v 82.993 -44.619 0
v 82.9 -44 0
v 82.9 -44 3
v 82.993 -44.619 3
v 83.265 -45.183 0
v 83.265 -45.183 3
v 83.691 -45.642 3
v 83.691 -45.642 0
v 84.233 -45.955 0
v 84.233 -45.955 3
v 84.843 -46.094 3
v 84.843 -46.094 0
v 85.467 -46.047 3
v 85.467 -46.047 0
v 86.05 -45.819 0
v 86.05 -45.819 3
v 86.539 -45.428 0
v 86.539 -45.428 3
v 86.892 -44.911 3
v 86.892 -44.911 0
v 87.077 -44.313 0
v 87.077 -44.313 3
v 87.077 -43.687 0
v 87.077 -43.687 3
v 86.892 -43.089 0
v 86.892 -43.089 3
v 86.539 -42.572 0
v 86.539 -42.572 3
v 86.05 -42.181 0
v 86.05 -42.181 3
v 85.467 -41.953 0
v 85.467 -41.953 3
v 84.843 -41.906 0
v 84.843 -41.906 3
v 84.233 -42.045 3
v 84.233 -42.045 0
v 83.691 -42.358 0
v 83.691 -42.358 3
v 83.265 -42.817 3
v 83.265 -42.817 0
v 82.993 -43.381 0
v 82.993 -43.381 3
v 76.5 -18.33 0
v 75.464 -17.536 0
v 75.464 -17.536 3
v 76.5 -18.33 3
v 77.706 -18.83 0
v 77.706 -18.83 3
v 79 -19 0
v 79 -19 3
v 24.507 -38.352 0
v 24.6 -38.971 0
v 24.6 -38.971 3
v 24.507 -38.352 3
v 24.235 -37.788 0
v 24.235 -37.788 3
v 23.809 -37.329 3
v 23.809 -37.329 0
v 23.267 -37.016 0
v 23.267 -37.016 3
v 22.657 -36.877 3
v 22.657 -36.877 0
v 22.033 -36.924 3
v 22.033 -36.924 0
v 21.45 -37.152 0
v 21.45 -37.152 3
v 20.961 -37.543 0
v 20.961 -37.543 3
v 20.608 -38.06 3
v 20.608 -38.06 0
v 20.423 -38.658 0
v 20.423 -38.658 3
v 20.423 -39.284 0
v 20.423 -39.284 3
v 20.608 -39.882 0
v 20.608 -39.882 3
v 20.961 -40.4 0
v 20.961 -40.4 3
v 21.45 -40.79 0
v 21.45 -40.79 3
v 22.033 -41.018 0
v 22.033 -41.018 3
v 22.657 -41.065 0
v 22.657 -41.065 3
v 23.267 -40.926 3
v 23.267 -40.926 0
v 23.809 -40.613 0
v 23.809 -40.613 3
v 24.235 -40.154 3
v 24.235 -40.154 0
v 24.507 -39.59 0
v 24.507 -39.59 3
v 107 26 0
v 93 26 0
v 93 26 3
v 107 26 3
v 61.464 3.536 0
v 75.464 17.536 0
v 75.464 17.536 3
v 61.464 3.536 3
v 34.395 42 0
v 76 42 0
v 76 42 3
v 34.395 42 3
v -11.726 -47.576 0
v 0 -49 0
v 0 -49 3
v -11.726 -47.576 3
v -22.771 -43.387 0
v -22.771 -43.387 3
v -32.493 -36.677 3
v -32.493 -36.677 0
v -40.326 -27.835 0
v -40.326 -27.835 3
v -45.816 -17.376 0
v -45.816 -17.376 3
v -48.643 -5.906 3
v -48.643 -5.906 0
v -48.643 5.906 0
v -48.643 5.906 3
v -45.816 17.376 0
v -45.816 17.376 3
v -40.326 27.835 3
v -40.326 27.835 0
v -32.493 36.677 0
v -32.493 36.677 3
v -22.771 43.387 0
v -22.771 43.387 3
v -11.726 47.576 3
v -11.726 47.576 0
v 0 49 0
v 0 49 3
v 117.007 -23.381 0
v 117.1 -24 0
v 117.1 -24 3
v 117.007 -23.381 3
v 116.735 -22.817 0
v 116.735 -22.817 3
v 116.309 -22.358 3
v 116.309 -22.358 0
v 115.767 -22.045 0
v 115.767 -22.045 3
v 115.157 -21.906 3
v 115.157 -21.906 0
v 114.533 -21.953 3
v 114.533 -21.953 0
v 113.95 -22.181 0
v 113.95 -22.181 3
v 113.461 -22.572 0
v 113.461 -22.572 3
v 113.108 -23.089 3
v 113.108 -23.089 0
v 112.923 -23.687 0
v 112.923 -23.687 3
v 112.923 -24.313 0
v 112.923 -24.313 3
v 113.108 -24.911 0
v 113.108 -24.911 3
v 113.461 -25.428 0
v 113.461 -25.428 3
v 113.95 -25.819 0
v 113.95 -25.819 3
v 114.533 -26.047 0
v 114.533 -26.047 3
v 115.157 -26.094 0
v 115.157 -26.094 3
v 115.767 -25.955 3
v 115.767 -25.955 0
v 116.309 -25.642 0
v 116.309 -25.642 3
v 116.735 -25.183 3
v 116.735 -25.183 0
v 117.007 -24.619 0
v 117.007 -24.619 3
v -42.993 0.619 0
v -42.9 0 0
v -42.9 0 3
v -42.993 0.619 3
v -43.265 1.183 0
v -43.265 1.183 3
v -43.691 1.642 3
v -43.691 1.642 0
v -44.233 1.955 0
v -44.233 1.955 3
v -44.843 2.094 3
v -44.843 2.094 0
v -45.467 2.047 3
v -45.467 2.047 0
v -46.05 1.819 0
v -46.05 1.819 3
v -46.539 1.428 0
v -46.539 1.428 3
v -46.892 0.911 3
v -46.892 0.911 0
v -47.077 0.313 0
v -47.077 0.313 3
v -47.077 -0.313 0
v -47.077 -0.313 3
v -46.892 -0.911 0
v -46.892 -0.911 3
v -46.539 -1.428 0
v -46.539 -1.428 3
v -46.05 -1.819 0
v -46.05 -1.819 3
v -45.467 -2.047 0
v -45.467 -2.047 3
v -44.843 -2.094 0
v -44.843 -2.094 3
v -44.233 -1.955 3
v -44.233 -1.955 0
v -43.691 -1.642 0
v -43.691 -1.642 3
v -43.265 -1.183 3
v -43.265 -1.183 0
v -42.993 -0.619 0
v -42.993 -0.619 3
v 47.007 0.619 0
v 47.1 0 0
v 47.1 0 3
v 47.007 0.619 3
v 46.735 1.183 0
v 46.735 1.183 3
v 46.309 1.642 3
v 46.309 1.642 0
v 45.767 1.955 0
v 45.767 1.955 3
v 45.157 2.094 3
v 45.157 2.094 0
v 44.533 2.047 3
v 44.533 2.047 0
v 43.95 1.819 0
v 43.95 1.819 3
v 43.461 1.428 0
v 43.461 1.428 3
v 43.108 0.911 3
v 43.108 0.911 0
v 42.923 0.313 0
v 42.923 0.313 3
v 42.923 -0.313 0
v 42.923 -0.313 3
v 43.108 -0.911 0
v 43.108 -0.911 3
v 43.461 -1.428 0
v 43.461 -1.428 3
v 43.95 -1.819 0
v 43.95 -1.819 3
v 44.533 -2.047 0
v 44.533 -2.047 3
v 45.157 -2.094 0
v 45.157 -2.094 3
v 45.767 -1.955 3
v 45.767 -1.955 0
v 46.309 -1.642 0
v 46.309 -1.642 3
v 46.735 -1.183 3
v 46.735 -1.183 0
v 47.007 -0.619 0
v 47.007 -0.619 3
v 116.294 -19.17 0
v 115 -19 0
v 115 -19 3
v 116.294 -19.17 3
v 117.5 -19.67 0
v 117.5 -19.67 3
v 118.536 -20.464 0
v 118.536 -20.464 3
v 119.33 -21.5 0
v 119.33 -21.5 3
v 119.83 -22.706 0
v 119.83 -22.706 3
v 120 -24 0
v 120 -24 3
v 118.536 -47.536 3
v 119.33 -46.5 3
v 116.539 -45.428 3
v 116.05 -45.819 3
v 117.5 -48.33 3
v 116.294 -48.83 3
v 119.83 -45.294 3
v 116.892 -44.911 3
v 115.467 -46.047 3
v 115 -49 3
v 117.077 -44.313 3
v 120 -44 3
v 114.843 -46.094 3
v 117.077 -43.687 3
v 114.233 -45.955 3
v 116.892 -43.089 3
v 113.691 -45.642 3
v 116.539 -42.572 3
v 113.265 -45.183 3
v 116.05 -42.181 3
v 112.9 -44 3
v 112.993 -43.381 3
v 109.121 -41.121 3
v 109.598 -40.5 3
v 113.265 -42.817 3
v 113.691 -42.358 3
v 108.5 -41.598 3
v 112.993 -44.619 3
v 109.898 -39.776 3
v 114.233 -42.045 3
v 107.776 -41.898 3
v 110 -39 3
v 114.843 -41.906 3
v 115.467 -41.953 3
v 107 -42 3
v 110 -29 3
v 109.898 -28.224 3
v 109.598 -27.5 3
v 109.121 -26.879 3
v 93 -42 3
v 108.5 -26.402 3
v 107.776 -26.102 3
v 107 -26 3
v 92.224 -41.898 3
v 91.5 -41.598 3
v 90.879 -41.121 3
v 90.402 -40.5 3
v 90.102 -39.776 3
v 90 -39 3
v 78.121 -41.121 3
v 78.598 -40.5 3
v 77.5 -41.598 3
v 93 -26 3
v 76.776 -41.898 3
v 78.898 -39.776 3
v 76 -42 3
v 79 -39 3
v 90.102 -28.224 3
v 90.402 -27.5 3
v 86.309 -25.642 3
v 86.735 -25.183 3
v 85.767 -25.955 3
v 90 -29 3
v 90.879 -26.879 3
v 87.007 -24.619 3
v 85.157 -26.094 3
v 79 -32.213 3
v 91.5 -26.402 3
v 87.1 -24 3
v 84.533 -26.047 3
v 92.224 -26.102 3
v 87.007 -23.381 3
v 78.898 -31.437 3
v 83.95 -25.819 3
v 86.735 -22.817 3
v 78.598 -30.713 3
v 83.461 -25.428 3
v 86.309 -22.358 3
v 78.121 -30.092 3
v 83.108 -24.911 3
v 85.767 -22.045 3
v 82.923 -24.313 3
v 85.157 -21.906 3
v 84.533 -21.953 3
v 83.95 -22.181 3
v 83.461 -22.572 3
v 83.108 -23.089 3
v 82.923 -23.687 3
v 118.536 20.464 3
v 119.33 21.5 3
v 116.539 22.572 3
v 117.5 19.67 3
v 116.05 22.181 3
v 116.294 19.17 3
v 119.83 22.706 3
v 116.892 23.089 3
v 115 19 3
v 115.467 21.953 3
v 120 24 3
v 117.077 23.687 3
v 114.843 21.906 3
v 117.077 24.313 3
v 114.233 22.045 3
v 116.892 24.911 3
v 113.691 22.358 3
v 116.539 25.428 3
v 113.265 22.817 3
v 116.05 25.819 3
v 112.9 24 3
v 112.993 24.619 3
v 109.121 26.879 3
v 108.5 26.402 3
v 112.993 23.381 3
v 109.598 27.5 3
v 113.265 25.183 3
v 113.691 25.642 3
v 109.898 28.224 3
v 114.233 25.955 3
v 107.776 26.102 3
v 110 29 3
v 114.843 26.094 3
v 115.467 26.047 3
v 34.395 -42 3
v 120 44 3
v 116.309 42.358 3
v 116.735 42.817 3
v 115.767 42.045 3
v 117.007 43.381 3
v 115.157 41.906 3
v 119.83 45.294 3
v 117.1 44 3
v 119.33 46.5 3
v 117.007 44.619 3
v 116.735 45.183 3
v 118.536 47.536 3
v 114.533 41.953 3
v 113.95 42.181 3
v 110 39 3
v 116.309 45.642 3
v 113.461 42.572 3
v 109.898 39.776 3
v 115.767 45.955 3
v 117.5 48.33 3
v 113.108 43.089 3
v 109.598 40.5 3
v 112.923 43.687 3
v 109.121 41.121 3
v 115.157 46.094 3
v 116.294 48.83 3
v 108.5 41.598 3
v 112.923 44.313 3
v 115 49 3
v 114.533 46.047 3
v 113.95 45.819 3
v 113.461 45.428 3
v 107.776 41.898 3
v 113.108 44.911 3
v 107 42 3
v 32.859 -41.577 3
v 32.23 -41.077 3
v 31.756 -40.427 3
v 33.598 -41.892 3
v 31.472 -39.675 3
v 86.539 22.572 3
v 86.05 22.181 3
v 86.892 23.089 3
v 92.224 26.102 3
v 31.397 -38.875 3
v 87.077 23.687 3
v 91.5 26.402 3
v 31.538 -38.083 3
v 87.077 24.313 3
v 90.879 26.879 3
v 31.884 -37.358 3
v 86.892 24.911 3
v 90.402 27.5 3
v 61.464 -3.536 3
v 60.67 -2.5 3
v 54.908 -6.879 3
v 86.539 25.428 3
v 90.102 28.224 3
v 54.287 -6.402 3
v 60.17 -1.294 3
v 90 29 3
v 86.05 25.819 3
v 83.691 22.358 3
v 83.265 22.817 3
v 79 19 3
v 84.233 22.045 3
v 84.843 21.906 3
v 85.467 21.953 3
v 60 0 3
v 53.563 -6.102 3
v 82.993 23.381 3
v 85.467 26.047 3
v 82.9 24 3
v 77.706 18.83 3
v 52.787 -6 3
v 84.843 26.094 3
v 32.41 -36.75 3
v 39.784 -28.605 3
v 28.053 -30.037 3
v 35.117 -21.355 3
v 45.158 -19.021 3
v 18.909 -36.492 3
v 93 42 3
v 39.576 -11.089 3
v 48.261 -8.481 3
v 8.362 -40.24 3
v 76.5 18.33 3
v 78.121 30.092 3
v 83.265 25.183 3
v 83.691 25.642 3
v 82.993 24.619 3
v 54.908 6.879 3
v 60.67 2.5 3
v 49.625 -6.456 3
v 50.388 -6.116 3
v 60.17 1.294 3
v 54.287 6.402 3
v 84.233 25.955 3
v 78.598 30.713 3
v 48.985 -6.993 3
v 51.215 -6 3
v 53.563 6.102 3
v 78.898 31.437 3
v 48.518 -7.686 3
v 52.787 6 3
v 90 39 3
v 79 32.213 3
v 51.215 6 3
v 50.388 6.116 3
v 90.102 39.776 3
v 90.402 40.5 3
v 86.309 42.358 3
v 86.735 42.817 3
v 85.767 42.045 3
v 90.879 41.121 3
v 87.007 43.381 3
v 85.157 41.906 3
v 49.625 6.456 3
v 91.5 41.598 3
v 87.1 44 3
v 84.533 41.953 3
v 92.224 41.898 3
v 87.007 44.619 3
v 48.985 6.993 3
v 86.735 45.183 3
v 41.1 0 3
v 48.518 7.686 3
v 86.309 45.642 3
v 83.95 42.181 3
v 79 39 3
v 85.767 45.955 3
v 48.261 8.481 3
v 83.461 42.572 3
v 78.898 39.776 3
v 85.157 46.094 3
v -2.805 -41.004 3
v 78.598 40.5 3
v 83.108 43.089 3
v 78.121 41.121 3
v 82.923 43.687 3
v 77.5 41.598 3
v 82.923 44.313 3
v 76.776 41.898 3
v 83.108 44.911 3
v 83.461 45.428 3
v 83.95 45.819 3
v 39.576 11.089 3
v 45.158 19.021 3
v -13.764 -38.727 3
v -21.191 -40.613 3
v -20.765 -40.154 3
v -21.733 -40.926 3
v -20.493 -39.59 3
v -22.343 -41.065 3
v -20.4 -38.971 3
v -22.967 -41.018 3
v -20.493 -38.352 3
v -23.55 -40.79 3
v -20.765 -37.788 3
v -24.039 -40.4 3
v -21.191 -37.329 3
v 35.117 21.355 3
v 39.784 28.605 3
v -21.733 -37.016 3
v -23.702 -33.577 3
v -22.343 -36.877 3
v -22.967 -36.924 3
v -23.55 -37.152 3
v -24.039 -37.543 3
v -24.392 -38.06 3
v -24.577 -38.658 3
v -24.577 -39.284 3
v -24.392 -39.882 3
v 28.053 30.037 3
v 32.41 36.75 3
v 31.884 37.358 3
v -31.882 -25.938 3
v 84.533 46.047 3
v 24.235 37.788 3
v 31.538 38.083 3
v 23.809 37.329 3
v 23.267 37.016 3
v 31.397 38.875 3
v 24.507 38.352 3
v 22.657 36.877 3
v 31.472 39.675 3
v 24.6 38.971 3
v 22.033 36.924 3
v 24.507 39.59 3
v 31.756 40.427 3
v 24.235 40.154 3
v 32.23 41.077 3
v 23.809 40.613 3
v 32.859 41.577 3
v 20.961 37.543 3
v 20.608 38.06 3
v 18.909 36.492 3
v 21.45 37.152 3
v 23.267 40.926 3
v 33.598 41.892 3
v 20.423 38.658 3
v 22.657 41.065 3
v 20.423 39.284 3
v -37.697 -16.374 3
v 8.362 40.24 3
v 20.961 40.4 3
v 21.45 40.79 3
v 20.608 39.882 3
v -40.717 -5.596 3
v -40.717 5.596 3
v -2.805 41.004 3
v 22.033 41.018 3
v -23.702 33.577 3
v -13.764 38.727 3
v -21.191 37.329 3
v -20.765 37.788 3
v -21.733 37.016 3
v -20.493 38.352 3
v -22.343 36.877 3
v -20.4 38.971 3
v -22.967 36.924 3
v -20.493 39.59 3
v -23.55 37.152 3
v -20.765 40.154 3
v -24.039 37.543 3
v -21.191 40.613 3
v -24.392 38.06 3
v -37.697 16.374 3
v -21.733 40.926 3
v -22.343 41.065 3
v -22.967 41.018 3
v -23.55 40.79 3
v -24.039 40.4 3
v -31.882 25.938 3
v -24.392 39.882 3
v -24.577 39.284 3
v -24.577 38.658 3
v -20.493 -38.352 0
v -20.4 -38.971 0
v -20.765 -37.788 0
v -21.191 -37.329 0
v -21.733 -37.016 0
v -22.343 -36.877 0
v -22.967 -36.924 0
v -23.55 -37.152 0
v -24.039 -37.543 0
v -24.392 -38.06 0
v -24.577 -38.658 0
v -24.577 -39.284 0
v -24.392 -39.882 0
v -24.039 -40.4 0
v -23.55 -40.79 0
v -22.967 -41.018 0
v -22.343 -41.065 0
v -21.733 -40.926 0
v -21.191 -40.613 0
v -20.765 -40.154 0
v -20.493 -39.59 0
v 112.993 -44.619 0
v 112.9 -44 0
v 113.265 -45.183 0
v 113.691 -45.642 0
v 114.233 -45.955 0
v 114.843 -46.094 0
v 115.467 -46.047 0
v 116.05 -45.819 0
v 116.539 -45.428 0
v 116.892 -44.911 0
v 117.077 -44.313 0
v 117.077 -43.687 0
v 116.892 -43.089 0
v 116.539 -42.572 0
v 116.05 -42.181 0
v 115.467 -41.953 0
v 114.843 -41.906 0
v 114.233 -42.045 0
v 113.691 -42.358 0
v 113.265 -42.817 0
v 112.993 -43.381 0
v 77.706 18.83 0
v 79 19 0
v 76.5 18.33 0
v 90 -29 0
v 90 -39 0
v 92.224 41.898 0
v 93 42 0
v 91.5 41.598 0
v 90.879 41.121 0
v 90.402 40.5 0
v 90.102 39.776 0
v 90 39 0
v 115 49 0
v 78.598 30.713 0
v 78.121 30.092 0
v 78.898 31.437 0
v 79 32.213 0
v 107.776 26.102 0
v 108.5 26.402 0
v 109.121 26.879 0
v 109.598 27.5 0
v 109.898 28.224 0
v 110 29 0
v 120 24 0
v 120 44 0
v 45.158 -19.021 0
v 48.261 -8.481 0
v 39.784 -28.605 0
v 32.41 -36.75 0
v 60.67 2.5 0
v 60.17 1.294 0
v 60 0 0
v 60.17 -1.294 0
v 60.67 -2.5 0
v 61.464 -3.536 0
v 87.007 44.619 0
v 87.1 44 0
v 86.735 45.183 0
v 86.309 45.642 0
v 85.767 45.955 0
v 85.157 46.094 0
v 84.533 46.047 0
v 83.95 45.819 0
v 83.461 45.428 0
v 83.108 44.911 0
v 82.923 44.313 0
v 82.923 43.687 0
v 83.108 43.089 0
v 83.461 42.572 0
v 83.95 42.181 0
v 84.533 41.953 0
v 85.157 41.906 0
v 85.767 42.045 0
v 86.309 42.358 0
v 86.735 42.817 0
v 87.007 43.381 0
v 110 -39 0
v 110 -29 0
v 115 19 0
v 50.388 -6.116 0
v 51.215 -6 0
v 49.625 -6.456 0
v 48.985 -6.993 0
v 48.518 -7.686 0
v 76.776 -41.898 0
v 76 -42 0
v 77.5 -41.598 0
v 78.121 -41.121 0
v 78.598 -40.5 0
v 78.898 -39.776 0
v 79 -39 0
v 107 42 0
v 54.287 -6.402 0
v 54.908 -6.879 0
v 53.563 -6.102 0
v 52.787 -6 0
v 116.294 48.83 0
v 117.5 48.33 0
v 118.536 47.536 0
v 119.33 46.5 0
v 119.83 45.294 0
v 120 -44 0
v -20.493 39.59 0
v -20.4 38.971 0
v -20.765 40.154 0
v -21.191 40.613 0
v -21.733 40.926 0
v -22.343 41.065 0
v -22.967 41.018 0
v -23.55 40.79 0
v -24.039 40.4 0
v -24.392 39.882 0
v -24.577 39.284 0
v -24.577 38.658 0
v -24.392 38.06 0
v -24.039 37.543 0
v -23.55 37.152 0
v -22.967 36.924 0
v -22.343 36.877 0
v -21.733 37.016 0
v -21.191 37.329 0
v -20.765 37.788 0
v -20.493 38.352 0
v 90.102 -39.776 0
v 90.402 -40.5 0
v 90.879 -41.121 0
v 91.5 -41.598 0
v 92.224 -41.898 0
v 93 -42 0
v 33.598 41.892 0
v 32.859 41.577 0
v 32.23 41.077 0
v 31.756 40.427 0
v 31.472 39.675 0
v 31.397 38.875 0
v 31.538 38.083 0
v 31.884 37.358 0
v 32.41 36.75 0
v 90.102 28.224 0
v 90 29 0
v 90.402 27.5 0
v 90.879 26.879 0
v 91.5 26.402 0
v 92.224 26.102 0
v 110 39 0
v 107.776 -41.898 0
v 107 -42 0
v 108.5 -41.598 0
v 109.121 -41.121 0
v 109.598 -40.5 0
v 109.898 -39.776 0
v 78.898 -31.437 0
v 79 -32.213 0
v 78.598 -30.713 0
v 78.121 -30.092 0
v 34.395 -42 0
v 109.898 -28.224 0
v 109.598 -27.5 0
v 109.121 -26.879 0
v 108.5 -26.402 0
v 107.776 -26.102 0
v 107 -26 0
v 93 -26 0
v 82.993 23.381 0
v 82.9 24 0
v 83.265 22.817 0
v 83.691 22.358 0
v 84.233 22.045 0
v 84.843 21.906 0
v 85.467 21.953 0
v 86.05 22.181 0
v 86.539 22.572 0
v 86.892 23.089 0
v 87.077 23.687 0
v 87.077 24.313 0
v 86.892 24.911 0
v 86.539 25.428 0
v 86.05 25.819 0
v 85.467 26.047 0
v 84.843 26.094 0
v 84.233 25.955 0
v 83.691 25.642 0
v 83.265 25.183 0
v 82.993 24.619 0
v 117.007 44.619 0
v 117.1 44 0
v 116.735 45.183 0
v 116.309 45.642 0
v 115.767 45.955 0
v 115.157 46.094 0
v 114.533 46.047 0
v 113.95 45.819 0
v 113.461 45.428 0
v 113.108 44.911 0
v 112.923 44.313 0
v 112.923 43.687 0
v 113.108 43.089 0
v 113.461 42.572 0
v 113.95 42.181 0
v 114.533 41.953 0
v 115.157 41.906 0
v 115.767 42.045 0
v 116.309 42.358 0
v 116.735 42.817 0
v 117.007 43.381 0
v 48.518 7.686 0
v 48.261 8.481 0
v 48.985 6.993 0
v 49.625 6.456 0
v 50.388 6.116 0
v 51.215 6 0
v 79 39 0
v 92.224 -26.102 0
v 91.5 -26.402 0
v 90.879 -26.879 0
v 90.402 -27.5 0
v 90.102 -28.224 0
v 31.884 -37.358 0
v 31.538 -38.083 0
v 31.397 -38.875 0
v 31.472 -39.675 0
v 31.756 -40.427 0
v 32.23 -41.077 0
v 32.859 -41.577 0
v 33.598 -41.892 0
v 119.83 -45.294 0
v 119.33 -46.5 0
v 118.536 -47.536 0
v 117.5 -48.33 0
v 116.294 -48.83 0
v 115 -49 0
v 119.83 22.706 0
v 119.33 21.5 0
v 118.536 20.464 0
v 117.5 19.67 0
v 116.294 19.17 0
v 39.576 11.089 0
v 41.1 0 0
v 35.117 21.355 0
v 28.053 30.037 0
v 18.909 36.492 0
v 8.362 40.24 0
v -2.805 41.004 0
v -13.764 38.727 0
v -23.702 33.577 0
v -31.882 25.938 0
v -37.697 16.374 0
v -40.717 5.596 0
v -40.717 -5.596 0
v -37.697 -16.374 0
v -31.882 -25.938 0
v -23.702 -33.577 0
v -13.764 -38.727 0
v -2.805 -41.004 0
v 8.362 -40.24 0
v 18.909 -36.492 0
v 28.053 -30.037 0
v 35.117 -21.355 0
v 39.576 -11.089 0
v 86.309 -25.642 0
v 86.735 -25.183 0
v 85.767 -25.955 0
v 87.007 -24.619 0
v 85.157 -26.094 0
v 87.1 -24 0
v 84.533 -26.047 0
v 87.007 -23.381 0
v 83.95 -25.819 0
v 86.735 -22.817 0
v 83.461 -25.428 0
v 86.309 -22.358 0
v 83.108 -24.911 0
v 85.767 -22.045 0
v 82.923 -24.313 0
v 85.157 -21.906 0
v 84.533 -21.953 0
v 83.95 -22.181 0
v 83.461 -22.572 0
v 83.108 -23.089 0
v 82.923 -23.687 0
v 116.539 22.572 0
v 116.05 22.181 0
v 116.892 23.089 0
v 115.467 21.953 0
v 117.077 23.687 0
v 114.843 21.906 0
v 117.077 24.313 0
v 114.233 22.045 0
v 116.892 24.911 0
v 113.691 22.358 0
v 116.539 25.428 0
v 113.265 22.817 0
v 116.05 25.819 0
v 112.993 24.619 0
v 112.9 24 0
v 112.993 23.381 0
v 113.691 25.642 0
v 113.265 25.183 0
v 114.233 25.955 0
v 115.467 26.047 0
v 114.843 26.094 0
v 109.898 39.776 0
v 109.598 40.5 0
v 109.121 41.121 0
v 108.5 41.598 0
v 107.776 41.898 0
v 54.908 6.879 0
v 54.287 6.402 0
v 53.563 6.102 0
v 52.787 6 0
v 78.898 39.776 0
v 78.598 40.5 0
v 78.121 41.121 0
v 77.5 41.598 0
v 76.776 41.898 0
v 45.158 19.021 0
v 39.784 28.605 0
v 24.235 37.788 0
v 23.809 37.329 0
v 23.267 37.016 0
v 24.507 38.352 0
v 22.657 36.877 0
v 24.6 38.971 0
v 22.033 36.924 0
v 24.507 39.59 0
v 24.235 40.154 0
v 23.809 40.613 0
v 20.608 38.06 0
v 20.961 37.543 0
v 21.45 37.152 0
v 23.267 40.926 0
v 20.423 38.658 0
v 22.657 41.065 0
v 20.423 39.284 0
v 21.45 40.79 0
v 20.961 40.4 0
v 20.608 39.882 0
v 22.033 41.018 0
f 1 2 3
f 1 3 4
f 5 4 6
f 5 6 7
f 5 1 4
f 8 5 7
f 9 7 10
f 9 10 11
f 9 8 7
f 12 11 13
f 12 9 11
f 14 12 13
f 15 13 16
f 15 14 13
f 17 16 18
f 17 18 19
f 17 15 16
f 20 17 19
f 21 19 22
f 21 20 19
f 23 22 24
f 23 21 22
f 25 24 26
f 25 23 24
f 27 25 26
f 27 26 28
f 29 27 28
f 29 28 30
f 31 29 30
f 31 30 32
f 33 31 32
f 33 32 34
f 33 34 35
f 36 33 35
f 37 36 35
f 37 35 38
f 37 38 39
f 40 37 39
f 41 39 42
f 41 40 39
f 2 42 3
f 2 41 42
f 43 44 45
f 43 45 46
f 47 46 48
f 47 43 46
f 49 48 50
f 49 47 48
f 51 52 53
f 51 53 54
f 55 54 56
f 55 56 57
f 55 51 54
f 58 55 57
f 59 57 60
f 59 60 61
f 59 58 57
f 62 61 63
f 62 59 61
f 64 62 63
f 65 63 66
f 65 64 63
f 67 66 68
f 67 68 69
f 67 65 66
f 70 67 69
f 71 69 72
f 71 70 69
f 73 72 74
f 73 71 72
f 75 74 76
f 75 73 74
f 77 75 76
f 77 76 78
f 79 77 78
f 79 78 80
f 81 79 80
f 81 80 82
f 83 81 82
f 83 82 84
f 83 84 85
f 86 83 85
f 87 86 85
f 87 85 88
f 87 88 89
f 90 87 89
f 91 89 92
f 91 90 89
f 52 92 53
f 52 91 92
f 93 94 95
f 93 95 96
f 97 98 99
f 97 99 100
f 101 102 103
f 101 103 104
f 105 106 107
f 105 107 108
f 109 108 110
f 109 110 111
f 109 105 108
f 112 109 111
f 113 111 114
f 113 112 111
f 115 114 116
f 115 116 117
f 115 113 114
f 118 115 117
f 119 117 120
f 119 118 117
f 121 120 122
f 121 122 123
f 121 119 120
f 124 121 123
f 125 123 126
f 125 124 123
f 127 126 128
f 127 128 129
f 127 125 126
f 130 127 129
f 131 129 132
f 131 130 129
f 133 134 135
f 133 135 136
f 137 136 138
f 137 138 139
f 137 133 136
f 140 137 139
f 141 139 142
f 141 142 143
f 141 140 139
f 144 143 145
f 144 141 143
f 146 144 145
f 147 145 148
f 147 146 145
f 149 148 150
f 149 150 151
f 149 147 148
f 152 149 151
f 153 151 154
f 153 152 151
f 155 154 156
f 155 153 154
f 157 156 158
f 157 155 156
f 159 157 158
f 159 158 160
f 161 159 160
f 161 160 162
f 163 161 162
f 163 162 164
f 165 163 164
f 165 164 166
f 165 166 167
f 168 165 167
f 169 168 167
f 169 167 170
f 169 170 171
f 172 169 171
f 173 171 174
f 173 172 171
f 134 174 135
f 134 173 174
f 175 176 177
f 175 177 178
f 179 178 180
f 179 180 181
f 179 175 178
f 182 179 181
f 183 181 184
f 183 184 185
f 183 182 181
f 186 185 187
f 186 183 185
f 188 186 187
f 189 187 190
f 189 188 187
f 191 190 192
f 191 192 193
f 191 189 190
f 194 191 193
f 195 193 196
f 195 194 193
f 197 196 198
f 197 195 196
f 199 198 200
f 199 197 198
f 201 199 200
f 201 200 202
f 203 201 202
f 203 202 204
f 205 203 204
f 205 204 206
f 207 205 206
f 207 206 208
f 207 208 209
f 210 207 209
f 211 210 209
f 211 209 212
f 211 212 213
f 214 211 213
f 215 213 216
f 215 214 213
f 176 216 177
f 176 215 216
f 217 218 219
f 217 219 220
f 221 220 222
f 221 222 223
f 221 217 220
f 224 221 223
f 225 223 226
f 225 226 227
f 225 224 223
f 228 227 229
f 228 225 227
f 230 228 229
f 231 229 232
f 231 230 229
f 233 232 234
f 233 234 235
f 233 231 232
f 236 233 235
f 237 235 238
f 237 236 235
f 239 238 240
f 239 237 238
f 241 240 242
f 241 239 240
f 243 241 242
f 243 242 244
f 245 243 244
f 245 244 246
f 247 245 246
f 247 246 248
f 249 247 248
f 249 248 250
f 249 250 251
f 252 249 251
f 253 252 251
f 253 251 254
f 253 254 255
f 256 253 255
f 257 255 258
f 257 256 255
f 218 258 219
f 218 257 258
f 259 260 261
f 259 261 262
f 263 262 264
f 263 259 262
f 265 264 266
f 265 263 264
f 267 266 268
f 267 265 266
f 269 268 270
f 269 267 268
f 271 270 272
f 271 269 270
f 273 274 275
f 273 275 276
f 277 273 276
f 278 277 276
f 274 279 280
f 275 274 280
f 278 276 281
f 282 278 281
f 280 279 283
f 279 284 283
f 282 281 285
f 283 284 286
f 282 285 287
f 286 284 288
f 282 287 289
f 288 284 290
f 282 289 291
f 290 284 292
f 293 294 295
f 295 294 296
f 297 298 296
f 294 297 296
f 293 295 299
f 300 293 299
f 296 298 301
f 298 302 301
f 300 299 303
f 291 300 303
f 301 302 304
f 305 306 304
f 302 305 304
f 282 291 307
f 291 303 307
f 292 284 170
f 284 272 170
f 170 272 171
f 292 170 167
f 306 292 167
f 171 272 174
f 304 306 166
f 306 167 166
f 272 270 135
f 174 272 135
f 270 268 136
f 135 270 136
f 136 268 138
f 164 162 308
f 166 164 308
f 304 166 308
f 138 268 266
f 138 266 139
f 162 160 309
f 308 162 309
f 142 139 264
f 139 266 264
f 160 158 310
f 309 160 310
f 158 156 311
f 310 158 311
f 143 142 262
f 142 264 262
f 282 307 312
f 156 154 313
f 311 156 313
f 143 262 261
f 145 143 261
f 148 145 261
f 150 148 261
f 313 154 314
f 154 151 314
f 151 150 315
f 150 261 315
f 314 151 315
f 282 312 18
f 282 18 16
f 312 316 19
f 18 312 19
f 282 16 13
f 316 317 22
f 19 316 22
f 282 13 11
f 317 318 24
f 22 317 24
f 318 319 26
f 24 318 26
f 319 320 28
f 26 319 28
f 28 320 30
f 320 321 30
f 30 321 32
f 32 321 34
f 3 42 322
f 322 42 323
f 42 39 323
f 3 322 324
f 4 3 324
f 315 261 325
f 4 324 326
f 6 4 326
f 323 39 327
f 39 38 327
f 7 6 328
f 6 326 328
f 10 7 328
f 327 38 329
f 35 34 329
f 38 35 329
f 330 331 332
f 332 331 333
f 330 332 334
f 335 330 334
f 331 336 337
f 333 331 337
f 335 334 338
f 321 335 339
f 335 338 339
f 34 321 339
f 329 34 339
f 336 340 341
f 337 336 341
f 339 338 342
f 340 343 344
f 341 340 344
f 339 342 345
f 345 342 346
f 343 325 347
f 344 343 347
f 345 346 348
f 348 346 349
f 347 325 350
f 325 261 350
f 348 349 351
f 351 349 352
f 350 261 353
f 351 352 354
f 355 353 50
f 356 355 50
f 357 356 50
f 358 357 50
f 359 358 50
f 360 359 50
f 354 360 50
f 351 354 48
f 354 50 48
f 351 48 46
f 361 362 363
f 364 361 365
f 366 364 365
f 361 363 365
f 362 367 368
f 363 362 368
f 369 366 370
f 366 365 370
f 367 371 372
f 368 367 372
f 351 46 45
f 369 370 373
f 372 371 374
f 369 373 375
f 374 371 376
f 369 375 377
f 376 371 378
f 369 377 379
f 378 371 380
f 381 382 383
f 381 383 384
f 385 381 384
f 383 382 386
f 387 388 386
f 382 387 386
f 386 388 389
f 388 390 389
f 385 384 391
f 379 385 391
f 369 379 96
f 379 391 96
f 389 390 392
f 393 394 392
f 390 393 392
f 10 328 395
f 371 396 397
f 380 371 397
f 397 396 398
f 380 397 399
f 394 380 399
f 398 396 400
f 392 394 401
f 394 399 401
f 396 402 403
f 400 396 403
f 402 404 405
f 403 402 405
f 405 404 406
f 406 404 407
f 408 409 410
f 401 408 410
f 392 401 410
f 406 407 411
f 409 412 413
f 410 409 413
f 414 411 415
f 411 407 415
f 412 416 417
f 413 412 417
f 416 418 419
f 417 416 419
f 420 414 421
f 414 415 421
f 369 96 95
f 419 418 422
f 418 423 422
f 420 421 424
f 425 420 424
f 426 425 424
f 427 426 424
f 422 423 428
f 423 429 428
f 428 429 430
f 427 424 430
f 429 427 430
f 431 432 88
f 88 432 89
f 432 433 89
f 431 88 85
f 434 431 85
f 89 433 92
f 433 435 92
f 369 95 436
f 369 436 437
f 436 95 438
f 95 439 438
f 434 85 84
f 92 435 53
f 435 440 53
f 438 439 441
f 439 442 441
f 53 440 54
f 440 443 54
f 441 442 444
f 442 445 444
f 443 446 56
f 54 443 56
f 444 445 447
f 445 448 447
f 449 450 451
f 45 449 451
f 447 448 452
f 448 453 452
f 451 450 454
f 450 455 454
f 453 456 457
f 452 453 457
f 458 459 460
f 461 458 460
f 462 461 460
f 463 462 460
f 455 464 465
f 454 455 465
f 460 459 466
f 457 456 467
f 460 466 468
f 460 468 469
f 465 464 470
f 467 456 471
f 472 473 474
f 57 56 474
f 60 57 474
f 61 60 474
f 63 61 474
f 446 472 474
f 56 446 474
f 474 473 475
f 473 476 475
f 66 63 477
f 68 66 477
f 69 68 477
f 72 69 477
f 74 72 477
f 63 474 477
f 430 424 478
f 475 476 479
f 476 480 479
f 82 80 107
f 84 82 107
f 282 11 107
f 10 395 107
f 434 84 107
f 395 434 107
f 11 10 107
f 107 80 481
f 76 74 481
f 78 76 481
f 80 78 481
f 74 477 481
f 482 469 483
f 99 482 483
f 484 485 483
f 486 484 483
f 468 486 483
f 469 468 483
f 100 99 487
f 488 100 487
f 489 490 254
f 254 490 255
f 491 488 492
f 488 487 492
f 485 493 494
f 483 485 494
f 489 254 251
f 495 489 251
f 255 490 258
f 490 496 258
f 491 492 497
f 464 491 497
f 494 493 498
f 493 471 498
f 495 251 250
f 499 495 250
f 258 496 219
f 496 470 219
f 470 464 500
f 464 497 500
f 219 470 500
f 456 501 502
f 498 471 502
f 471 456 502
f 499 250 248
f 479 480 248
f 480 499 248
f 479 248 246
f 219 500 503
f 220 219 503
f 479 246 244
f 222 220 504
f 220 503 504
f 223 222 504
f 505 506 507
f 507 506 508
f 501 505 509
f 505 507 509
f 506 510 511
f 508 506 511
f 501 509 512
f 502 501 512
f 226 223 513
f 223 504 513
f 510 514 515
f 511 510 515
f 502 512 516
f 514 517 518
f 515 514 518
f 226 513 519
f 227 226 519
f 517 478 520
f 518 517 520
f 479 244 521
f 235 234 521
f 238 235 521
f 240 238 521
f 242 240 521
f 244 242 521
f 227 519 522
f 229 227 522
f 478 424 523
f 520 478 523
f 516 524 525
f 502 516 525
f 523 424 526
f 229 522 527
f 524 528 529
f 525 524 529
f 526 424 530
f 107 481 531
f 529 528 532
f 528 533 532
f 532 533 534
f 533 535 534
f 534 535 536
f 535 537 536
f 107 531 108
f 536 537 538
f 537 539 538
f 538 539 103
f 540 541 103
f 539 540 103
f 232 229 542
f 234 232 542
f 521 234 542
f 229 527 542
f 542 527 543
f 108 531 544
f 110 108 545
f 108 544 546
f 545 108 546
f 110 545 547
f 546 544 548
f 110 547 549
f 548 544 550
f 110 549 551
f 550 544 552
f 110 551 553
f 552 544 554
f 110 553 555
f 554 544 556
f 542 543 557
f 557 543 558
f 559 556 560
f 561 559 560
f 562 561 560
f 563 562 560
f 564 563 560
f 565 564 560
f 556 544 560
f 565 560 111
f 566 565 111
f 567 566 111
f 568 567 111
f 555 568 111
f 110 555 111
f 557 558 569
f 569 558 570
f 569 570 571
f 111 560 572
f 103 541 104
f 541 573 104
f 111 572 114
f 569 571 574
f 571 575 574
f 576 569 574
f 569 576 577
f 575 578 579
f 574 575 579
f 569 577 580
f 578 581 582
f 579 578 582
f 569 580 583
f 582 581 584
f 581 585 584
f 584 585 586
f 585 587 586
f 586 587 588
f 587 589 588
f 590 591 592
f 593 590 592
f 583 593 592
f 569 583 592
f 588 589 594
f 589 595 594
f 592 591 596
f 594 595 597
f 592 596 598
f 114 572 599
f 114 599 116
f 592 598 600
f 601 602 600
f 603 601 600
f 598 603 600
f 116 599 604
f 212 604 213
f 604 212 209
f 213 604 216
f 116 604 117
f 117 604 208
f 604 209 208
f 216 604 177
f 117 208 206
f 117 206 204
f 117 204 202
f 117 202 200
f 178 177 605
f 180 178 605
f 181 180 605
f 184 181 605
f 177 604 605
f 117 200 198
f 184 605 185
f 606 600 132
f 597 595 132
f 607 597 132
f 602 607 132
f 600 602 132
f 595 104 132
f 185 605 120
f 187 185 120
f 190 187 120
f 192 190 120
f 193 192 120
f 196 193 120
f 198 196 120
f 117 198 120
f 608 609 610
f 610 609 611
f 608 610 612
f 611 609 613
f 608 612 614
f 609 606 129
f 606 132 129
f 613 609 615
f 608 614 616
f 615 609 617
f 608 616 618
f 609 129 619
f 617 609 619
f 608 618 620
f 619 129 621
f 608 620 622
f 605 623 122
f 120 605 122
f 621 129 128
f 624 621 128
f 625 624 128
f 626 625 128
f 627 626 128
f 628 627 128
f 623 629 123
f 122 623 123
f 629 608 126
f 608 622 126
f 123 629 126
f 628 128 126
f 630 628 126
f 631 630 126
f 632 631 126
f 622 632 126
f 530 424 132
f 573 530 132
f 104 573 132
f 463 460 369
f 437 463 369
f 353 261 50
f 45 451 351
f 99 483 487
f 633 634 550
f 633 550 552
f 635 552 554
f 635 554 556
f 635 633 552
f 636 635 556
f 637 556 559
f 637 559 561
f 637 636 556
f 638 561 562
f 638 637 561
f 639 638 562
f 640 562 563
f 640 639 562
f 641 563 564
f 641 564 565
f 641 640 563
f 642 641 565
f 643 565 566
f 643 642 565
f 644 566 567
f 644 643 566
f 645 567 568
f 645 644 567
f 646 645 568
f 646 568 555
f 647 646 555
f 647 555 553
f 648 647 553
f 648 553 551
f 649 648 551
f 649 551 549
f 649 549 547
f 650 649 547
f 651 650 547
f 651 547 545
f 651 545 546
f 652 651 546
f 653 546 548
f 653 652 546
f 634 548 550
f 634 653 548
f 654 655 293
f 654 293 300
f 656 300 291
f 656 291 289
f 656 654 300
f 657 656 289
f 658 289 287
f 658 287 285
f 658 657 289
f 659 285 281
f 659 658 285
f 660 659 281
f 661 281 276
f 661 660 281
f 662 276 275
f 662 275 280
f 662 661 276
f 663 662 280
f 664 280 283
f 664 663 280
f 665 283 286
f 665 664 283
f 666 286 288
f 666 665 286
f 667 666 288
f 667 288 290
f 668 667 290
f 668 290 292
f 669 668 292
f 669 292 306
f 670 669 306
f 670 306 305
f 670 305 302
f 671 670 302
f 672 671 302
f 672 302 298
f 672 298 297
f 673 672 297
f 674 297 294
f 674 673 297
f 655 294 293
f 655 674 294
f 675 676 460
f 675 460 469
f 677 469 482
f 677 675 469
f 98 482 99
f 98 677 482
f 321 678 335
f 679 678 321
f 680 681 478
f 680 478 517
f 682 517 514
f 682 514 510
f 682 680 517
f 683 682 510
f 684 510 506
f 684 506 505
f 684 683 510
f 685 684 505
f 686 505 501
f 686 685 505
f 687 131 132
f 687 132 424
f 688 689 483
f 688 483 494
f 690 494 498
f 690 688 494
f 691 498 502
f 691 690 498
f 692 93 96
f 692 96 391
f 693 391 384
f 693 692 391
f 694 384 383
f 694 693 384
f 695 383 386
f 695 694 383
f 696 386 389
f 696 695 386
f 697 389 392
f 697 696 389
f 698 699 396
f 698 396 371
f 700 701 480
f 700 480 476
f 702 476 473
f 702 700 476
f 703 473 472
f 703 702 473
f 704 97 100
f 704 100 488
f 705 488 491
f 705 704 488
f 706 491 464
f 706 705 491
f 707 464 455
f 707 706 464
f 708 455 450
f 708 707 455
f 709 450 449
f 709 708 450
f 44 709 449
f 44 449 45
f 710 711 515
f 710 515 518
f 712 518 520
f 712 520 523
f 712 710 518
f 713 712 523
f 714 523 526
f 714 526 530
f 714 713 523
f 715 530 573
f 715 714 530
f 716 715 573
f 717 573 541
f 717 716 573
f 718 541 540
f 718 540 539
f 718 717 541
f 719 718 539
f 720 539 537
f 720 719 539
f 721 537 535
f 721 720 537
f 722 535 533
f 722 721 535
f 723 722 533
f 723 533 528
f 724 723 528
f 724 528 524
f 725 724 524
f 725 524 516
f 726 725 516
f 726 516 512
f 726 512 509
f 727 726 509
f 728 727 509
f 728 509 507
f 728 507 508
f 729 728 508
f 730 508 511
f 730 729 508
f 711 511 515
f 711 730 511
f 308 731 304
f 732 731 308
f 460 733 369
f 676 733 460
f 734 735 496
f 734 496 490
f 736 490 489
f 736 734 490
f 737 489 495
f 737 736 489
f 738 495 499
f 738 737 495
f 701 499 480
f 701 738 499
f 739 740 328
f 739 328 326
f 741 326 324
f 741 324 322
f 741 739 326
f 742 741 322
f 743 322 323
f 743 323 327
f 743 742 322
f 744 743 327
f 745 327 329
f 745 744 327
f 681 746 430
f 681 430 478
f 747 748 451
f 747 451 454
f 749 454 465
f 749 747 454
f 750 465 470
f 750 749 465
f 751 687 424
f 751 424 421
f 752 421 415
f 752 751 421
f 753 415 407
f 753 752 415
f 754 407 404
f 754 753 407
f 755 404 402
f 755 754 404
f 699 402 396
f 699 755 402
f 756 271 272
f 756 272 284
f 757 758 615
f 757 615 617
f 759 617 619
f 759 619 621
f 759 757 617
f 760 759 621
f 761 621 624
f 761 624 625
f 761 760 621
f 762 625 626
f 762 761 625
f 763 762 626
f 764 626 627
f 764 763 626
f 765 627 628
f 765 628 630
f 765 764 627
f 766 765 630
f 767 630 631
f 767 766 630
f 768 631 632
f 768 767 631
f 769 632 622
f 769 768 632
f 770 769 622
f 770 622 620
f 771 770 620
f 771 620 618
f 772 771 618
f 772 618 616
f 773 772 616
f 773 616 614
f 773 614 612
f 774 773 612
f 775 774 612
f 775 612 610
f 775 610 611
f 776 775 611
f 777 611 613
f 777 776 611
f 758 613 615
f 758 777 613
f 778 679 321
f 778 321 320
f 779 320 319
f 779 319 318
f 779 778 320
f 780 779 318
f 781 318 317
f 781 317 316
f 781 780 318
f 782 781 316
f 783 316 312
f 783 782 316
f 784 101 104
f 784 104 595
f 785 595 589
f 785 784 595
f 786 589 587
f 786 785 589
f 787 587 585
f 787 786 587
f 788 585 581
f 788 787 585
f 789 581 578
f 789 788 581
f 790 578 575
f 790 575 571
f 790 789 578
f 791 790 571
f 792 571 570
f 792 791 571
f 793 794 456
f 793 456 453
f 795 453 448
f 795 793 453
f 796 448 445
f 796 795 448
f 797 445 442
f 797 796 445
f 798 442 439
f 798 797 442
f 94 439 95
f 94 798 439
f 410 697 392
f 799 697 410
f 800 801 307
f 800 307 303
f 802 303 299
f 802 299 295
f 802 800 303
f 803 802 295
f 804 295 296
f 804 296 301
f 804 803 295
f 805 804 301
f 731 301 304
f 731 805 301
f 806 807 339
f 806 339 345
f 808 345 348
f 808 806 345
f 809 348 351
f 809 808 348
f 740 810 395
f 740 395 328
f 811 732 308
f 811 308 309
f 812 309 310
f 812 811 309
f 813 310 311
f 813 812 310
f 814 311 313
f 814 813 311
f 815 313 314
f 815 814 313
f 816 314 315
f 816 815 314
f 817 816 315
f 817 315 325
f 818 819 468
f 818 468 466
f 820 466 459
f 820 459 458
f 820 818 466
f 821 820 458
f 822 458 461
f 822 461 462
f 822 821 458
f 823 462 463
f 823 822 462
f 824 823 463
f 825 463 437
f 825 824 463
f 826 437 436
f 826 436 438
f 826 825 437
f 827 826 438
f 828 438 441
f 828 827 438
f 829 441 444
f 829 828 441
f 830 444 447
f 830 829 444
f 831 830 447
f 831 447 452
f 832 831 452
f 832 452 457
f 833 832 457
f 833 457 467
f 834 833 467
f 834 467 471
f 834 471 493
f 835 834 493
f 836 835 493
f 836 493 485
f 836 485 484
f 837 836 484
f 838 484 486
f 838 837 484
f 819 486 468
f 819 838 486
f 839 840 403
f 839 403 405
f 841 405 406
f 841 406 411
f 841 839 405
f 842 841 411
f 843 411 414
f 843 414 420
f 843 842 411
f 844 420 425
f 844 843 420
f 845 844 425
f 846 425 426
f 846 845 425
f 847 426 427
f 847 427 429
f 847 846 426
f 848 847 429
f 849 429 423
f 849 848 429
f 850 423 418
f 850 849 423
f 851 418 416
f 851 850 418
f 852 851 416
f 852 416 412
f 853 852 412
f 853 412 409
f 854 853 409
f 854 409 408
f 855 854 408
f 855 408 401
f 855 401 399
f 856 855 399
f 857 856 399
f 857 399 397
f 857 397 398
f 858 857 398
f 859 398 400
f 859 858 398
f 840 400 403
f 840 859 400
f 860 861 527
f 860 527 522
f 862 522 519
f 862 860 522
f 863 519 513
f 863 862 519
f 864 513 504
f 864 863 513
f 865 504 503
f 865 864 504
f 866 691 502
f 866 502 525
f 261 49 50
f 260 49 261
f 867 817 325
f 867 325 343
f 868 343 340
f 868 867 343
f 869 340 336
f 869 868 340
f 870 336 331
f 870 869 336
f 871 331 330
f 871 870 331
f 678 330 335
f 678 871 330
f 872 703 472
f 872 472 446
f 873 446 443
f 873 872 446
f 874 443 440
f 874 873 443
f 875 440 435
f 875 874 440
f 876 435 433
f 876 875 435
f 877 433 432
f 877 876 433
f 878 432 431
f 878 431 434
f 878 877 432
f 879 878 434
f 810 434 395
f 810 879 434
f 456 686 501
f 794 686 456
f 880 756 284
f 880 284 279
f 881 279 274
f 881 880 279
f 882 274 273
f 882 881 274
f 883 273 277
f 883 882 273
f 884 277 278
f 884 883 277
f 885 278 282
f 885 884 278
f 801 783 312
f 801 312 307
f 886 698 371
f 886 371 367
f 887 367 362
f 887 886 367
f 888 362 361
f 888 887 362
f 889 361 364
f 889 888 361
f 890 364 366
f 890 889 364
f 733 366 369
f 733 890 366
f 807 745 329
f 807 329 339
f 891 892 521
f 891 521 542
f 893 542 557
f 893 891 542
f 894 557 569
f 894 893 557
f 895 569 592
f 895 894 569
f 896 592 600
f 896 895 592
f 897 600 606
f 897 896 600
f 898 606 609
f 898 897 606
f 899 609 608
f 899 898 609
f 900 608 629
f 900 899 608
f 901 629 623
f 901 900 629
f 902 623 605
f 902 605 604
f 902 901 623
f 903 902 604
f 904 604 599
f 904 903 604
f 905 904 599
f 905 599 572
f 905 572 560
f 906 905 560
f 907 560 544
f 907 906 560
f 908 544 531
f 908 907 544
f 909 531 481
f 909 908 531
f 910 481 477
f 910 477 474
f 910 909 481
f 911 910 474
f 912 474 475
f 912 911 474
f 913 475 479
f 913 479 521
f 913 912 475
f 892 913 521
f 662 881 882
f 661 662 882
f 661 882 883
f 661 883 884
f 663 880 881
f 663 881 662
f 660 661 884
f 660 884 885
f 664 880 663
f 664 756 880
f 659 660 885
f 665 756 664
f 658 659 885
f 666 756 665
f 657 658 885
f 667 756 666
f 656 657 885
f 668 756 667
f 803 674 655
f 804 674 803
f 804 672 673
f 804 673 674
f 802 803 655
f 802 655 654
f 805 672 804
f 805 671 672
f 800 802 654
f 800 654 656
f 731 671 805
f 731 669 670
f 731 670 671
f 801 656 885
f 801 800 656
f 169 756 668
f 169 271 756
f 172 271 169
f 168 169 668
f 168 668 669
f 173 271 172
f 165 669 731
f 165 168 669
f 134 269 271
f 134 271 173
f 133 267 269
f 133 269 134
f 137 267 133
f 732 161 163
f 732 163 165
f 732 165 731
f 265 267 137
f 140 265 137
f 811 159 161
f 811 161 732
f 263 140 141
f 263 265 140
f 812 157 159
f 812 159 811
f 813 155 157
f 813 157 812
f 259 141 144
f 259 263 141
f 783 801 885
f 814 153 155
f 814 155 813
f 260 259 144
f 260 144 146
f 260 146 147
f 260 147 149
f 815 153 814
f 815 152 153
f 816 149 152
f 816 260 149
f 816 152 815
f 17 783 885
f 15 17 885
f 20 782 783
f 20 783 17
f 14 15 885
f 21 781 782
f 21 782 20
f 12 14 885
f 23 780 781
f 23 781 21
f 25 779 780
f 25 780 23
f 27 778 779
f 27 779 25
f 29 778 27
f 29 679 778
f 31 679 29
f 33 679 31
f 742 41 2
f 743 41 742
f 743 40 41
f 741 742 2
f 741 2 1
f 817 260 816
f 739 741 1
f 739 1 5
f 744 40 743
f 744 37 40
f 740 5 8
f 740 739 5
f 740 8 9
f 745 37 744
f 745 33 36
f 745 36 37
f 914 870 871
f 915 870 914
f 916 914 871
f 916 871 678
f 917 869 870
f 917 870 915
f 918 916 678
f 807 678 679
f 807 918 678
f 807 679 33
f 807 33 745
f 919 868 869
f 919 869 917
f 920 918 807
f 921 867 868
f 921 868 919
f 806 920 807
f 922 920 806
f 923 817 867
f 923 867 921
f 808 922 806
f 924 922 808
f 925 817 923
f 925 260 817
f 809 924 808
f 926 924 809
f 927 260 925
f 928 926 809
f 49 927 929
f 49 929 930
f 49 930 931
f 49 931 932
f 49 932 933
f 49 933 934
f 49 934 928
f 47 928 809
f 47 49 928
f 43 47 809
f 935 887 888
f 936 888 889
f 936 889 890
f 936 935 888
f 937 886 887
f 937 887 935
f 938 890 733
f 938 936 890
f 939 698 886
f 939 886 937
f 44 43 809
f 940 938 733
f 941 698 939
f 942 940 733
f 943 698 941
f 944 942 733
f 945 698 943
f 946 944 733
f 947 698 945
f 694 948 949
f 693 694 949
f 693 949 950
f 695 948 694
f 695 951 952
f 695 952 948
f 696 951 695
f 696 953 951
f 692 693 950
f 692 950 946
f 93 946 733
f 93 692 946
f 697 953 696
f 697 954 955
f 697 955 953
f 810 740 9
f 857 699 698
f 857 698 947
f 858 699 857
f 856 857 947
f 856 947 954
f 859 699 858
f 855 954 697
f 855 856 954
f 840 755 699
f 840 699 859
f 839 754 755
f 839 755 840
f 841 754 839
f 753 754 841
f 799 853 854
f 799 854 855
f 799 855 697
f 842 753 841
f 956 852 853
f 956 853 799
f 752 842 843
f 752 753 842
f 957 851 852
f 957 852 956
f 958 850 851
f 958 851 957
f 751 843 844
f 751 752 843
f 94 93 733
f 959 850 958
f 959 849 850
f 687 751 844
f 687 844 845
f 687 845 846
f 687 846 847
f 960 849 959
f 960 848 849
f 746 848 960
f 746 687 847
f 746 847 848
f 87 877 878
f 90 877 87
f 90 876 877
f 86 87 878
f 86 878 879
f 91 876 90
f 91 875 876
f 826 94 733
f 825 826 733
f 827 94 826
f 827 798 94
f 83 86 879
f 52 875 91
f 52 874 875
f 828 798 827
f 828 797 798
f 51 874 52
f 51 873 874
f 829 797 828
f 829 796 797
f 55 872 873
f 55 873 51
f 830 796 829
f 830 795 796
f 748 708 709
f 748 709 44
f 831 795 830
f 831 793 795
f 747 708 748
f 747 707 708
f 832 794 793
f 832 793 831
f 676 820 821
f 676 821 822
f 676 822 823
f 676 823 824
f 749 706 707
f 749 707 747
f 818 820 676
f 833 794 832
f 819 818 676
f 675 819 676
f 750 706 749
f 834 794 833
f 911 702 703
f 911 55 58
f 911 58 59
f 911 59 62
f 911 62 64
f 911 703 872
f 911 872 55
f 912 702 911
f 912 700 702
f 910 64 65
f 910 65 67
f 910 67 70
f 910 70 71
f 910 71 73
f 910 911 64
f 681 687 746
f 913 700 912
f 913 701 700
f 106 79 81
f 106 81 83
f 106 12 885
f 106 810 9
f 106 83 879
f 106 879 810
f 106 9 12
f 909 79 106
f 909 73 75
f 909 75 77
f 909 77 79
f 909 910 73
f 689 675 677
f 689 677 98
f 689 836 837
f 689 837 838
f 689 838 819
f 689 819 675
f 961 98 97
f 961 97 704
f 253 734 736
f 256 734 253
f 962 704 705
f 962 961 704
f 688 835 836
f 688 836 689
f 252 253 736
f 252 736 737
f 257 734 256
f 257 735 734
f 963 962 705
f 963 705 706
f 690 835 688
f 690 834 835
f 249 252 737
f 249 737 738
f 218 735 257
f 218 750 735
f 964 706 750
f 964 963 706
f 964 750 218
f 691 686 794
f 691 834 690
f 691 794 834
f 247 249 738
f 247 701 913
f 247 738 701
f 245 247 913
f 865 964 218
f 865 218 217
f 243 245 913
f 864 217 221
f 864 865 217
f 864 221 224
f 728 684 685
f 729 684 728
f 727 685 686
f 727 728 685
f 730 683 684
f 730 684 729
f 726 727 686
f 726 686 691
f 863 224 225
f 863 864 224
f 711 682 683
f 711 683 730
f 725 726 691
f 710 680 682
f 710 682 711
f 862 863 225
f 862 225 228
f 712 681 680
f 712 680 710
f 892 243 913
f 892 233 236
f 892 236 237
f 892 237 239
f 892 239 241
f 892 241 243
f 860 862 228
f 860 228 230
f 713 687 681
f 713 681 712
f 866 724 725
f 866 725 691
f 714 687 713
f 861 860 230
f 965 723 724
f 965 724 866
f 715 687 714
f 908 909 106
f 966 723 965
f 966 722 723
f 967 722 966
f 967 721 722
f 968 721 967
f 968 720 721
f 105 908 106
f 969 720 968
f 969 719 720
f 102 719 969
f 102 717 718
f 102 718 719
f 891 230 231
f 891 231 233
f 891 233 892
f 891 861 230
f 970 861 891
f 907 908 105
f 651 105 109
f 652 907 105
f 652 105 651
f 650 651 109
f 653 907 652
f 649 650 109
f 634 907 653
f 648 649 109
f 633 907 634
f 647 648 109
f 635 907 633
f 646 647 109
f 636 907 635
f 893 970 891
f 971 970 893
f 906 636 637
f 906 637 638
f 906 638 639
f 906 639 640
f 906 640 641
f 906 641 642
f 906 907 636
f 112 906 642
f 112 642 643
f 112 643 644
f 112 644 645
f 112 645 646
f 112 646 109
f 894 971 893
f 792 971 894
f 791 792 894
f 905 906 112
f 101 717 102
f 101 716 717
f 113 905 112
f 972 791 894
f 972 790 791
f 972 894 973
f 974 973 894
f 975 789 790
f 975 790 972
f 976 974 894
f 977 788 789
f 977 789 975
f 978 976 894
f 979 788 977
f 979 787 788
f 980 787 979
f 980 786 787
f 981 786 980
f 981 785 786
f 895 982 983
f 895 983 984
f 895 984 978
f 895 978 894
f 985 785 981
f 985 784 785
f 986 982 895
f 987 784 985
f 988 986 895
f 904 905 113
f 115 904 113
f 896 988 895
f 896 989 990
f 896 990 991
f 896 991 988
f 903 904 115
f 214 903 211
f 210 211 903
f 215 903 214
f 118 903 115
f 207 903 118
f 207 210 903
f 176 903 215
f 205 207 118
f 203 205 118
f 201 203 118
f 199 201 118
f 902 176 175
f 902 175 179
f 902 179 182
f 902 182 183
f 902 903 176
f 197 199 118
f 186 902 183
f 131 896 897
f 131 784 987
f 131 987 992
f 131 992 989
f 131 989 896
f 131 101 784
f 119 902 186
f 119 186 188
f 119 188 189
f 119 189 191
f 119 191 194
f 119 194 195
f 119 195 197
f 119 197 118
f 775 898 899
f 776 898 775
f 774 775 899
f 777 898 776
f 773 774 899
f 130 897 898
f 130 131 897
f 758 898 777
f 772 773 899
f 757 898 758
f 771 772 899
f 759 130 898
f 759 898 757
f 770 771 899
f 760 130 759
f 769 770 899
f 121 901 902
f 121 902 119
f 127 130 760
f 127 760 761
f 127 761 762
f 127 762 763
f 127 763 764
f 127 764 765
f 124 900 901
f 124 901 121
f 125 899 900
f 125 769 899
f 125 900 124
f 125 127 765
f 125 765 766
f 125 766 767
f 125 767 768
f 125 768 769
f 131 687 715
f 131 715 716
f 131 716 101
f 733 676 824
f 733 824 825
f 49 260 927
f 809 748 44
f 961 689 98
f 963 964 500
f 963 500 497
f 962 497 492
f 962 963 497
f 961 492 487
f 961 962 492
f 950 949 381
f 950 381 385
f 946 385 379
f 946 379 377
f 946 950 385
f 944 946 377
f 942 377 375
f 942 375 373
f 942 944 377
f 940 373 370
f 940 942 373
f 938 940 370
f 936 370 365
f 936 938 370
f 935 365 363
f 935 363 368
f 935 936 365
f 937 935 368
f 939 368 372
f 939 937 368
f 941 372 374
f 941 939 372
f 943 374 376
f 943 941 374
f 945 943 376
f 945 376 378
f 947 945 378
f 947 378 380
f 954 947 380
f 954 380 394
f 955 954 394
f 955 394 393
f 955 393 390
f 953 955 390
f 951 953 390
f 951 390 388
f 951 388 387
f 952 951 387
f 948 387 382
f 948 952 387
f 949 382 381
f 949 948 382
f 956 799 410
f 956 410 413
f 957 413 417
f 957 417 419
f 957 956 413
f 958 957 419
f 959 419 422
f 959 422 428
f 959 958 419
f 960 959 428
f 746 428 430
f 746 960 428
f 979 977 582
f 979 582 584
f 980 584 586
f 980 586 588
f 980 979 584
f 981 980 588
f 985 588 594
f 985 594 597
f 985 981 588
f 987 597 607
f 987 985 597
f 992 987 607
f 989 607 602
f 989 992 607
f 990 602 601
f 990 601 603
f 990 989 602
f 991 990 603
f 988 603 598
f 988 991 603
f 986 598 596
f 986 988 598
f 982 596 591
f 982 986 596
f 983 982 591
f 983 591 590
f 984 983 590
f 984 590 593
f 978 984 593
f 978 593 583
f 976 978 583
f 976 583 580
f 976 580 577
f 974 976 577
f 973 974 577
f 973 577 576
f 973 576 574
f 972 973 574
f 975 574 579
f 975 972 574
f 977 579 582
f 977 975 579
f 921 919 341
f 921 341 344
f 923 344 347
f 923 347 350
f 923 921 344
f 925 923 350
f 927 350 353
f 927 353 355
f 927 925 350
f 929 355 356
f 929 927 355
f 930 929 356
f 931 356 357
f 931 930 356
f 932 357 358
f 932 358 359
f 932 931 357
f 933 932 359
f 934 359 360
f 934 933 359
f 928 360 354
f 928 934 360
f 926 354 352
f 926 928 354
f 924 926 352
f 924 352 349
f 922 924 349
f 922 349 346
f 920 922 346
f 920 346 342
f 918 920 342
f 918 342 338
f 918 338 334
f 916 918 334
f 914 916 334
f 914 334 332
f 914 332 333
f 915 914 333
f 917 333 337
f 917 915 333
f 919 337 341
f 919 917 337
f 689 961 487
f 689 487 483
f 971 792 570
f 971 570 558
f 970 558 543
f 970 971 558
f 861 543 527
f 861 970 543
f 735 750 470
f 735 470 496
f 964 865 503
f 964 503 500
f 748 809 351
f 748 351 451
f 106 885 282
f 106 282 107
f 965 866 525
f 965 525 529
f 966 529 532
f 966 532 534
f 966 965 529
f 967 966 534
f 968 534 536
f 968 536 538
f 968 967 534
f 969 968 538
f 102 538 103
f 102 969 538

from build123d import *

# Parameters (mm, degrees)
SKETCH_1_R          = 2.1
SKETCH_1_R_2        = 41.1
EXTRUDE_1_DEPTH     = 3
SKETCH_2_R          = 2.1
CUT_EXTRUDE_1_DEPTH = 3


with BuildPart() as part:
    # 草图1 → 凸台-拉伸1 (new body)
    with BuildSketch(Plane.XY):
        with BuildLine():
            Line((0, 49), (115, 49))
            ThreePointArc((115, 49), (118.535533906, 47.535533906), (120, 44))
            Line((120, 44), (120, 24))
            ThreePointArc((120, 24), (118.535533906, 20.464466094), (115, 19))
            Line((115, 19), (79, 19))
            ThreePointArc((79, 19), (77.086582838, 18.619397663), (75.464466094, 17.535533906))
            Line((75.464466094, 17.535533906), (61.464466094, 3.535533906))
            ThreePointArc((61.464466094, 3.535533906), (60, 0), (61.464466094, -3.535533906))
            Line((61.464466094, -3.535533906), (75.464466094, -17.535533906))
            ThreePointArc((75.464466094, -17.535533906), (77.086582838, -18.619397663), (79, -19))
            Line((79, -19), (115, -19))
            ThreePointArc((115, -19), (118.535533906, -20.464466094), (120, -24))
            Line((120, -24), (120, -44))
            ThreePointArc((120, -44), (118.535533906, -47.535533906), (115, -49))
            Line((115, -49), (0, -49))
            ThreePointArc((0, -49), (-49, 0), (0, 49))
        make_face()
        with Locations((-45, 0)):
            Circle(SKETCH_1_R, mode=Mode.SUBTRACT)
        with Locations((-22.5, 38.97114317)):
            Circle(SKETCH_1_R, mode=Mode.SUBTRACT)
        with Locations((22.5, 38.97114317)):
            Circle(SKETCH_1_R, mode=Mode.SUBTRACT)
        with Locations((45, 0)):
            Circle(SKETCH_1_R, mode=Mode.SUBTRACT)
        with Locations((22.5, -38.97114317)):
            Circle(SKETCH_1_R, mode=Mode.SUBTRACT)
        with Locations((-22.5, -38.97114317)):
            Circle(SKETCH_1_R, mode=Mode.SUBTRACT)
        Circle(SKETCH_1_R_2, mode=Mode.SUBTRACT)
        with BuildLine():
            Line((93, -42), (107, -42))
            ThreePointArc((107, -42), (109.121320344, -41.121320344), (110, -39))
            Line((110, -39), (110, -29))
            ThreePointArc((110, -29), (109.121320344, -26.878679656), (107, -26))
            Line((107, -26), (93, -26))
            ThreePointArc((93, -26), (90.878679656, -26.878679656), (90, -29))
            Line((90, -29), (90, -39))
            ThreePointArc((90, -39), (90.878679656, -41.121320344), (93, -42))
        make_face(mode=Mode.SUBTRACT)
        with BuildLine():
            Line((34.394767044, -42), (76, -42))
            ThreePointArc((76, -42), (78.121320344, -41.121320344), (79, -39))
            Line((79, -39), (79, -32.213203436))
            ThreePointArc((79, -32.213203436), (78.771638598, -31.065153138), (78.121320344, -30.091883092))
            Line((78.121320344, -30.091883092), (54.908116908, -6.878679656))
            ThreePointArc((54.908116908, -6.878679656), (53.934846861, -6.228361402), (52.786796564, -6))
            Line((52.786796564, -6), (51.215232109, -6))
            ThreePointArc((51.215232109, -6), (49.28620286, -6.702426029), (48.26050718, -8.480769231))
            ThreePointArc((48.26050718, -8.480769231), (42.740359483, -23.963757452), (32.410453561, -36.75))
            ThreePointArc((32.410453561, -36.75), (31.588524004, -40.060660172), (34.394767044, -42))
        make_face(mode=Mode.SUBTRACT)
        with BuildLine():
            Line((93, 26), (107, 26))
            ThreePointArc((107, 26), (109.121320344, 26.878679656), (110, 29))
            Line((110, 29), (110, 39))
            ThreePointArc((110, 39), (109.121320344, 41.121320344), (107, 42))
            Line((107, 42), (93, 42))
            ThreePointArc((93, 42), (90.878679656, 41.121320344), (90, 39))
            Line((90, 39), (90, 29))
            ThreePointArc((90, 29), (90.878679656, 26.878679656), (93, 26))
        make_face(mode=Mode.SUBTRACT)
        with BuildLine():
            Line((51.215232109, 6), (52.786796564, 6))
            ThreePointArc((52.786796564, 6), (53.934846861, 6.228361402), (54.908116908, 6.878679656))
            Line((54.908116908, 6.878679656), (78.121320344, 30.091883092))
            ThreePointArc((78.121320344, 30.091883092), (78.771638598, 31.065153139), (79, 32.213203436))
            Line((79, 32.213203436), (79, 39))
            ThreePointArc((79, 39), (78.121320344, 41.121320344), (76, 42))
            Line((76, 42), (34.394767044, 42))
            ThreePointArc((34.394767044, 42), (31.588524004, 40.060660172), (32.410453561, 36.75))
            ThreePointArc((32.410453561, 36.75), (42.740359483, 23.963757452), (48.26050718, 8.480769231))
            ThreePointArc((48.26050718, 8.480769231), (49.28620286, 6.702426029), (51.215232109, 6))
        make_face(mode=Mode.SUBTRACT)
    extrude(amount=EXTRUDE_1_DEPTH)

    # 草图2 → 切除-拉伸1 (cut)
    with BuildSketch(Plane.XY):
        with Locations((85, 44)):
            Circle(SKETCH_2_R)
        with Locations((115, 44)):
            Circle(SKETCH_2_R)
        with Locations(Location((115, 24, 0), (0, 0, 180))):
            Circle(SKETCH_2_R)
        with Locations(Location((85, 24, 0), (0, 0, 180))):
            Circle(SKETCH_2_R)
        with Locations((85, -24)):
            Circle(SKETCH_2_R)
        with Locations((115, -24)):
            Circle(SKETCH_2_R)
        with Locations(Location((115, -44, 0), (0, 0, 180))):
            Circle(SKETCH_2_R)
        with Locations(Location((85, -44, 0), (0, 0, 180))):
            Circle(SKETCH_2_R)
    extrude(amount=CUT_EXTRUDE_1_DEPTH, mode=Mode.SUBTRACT)


solid = part.part
